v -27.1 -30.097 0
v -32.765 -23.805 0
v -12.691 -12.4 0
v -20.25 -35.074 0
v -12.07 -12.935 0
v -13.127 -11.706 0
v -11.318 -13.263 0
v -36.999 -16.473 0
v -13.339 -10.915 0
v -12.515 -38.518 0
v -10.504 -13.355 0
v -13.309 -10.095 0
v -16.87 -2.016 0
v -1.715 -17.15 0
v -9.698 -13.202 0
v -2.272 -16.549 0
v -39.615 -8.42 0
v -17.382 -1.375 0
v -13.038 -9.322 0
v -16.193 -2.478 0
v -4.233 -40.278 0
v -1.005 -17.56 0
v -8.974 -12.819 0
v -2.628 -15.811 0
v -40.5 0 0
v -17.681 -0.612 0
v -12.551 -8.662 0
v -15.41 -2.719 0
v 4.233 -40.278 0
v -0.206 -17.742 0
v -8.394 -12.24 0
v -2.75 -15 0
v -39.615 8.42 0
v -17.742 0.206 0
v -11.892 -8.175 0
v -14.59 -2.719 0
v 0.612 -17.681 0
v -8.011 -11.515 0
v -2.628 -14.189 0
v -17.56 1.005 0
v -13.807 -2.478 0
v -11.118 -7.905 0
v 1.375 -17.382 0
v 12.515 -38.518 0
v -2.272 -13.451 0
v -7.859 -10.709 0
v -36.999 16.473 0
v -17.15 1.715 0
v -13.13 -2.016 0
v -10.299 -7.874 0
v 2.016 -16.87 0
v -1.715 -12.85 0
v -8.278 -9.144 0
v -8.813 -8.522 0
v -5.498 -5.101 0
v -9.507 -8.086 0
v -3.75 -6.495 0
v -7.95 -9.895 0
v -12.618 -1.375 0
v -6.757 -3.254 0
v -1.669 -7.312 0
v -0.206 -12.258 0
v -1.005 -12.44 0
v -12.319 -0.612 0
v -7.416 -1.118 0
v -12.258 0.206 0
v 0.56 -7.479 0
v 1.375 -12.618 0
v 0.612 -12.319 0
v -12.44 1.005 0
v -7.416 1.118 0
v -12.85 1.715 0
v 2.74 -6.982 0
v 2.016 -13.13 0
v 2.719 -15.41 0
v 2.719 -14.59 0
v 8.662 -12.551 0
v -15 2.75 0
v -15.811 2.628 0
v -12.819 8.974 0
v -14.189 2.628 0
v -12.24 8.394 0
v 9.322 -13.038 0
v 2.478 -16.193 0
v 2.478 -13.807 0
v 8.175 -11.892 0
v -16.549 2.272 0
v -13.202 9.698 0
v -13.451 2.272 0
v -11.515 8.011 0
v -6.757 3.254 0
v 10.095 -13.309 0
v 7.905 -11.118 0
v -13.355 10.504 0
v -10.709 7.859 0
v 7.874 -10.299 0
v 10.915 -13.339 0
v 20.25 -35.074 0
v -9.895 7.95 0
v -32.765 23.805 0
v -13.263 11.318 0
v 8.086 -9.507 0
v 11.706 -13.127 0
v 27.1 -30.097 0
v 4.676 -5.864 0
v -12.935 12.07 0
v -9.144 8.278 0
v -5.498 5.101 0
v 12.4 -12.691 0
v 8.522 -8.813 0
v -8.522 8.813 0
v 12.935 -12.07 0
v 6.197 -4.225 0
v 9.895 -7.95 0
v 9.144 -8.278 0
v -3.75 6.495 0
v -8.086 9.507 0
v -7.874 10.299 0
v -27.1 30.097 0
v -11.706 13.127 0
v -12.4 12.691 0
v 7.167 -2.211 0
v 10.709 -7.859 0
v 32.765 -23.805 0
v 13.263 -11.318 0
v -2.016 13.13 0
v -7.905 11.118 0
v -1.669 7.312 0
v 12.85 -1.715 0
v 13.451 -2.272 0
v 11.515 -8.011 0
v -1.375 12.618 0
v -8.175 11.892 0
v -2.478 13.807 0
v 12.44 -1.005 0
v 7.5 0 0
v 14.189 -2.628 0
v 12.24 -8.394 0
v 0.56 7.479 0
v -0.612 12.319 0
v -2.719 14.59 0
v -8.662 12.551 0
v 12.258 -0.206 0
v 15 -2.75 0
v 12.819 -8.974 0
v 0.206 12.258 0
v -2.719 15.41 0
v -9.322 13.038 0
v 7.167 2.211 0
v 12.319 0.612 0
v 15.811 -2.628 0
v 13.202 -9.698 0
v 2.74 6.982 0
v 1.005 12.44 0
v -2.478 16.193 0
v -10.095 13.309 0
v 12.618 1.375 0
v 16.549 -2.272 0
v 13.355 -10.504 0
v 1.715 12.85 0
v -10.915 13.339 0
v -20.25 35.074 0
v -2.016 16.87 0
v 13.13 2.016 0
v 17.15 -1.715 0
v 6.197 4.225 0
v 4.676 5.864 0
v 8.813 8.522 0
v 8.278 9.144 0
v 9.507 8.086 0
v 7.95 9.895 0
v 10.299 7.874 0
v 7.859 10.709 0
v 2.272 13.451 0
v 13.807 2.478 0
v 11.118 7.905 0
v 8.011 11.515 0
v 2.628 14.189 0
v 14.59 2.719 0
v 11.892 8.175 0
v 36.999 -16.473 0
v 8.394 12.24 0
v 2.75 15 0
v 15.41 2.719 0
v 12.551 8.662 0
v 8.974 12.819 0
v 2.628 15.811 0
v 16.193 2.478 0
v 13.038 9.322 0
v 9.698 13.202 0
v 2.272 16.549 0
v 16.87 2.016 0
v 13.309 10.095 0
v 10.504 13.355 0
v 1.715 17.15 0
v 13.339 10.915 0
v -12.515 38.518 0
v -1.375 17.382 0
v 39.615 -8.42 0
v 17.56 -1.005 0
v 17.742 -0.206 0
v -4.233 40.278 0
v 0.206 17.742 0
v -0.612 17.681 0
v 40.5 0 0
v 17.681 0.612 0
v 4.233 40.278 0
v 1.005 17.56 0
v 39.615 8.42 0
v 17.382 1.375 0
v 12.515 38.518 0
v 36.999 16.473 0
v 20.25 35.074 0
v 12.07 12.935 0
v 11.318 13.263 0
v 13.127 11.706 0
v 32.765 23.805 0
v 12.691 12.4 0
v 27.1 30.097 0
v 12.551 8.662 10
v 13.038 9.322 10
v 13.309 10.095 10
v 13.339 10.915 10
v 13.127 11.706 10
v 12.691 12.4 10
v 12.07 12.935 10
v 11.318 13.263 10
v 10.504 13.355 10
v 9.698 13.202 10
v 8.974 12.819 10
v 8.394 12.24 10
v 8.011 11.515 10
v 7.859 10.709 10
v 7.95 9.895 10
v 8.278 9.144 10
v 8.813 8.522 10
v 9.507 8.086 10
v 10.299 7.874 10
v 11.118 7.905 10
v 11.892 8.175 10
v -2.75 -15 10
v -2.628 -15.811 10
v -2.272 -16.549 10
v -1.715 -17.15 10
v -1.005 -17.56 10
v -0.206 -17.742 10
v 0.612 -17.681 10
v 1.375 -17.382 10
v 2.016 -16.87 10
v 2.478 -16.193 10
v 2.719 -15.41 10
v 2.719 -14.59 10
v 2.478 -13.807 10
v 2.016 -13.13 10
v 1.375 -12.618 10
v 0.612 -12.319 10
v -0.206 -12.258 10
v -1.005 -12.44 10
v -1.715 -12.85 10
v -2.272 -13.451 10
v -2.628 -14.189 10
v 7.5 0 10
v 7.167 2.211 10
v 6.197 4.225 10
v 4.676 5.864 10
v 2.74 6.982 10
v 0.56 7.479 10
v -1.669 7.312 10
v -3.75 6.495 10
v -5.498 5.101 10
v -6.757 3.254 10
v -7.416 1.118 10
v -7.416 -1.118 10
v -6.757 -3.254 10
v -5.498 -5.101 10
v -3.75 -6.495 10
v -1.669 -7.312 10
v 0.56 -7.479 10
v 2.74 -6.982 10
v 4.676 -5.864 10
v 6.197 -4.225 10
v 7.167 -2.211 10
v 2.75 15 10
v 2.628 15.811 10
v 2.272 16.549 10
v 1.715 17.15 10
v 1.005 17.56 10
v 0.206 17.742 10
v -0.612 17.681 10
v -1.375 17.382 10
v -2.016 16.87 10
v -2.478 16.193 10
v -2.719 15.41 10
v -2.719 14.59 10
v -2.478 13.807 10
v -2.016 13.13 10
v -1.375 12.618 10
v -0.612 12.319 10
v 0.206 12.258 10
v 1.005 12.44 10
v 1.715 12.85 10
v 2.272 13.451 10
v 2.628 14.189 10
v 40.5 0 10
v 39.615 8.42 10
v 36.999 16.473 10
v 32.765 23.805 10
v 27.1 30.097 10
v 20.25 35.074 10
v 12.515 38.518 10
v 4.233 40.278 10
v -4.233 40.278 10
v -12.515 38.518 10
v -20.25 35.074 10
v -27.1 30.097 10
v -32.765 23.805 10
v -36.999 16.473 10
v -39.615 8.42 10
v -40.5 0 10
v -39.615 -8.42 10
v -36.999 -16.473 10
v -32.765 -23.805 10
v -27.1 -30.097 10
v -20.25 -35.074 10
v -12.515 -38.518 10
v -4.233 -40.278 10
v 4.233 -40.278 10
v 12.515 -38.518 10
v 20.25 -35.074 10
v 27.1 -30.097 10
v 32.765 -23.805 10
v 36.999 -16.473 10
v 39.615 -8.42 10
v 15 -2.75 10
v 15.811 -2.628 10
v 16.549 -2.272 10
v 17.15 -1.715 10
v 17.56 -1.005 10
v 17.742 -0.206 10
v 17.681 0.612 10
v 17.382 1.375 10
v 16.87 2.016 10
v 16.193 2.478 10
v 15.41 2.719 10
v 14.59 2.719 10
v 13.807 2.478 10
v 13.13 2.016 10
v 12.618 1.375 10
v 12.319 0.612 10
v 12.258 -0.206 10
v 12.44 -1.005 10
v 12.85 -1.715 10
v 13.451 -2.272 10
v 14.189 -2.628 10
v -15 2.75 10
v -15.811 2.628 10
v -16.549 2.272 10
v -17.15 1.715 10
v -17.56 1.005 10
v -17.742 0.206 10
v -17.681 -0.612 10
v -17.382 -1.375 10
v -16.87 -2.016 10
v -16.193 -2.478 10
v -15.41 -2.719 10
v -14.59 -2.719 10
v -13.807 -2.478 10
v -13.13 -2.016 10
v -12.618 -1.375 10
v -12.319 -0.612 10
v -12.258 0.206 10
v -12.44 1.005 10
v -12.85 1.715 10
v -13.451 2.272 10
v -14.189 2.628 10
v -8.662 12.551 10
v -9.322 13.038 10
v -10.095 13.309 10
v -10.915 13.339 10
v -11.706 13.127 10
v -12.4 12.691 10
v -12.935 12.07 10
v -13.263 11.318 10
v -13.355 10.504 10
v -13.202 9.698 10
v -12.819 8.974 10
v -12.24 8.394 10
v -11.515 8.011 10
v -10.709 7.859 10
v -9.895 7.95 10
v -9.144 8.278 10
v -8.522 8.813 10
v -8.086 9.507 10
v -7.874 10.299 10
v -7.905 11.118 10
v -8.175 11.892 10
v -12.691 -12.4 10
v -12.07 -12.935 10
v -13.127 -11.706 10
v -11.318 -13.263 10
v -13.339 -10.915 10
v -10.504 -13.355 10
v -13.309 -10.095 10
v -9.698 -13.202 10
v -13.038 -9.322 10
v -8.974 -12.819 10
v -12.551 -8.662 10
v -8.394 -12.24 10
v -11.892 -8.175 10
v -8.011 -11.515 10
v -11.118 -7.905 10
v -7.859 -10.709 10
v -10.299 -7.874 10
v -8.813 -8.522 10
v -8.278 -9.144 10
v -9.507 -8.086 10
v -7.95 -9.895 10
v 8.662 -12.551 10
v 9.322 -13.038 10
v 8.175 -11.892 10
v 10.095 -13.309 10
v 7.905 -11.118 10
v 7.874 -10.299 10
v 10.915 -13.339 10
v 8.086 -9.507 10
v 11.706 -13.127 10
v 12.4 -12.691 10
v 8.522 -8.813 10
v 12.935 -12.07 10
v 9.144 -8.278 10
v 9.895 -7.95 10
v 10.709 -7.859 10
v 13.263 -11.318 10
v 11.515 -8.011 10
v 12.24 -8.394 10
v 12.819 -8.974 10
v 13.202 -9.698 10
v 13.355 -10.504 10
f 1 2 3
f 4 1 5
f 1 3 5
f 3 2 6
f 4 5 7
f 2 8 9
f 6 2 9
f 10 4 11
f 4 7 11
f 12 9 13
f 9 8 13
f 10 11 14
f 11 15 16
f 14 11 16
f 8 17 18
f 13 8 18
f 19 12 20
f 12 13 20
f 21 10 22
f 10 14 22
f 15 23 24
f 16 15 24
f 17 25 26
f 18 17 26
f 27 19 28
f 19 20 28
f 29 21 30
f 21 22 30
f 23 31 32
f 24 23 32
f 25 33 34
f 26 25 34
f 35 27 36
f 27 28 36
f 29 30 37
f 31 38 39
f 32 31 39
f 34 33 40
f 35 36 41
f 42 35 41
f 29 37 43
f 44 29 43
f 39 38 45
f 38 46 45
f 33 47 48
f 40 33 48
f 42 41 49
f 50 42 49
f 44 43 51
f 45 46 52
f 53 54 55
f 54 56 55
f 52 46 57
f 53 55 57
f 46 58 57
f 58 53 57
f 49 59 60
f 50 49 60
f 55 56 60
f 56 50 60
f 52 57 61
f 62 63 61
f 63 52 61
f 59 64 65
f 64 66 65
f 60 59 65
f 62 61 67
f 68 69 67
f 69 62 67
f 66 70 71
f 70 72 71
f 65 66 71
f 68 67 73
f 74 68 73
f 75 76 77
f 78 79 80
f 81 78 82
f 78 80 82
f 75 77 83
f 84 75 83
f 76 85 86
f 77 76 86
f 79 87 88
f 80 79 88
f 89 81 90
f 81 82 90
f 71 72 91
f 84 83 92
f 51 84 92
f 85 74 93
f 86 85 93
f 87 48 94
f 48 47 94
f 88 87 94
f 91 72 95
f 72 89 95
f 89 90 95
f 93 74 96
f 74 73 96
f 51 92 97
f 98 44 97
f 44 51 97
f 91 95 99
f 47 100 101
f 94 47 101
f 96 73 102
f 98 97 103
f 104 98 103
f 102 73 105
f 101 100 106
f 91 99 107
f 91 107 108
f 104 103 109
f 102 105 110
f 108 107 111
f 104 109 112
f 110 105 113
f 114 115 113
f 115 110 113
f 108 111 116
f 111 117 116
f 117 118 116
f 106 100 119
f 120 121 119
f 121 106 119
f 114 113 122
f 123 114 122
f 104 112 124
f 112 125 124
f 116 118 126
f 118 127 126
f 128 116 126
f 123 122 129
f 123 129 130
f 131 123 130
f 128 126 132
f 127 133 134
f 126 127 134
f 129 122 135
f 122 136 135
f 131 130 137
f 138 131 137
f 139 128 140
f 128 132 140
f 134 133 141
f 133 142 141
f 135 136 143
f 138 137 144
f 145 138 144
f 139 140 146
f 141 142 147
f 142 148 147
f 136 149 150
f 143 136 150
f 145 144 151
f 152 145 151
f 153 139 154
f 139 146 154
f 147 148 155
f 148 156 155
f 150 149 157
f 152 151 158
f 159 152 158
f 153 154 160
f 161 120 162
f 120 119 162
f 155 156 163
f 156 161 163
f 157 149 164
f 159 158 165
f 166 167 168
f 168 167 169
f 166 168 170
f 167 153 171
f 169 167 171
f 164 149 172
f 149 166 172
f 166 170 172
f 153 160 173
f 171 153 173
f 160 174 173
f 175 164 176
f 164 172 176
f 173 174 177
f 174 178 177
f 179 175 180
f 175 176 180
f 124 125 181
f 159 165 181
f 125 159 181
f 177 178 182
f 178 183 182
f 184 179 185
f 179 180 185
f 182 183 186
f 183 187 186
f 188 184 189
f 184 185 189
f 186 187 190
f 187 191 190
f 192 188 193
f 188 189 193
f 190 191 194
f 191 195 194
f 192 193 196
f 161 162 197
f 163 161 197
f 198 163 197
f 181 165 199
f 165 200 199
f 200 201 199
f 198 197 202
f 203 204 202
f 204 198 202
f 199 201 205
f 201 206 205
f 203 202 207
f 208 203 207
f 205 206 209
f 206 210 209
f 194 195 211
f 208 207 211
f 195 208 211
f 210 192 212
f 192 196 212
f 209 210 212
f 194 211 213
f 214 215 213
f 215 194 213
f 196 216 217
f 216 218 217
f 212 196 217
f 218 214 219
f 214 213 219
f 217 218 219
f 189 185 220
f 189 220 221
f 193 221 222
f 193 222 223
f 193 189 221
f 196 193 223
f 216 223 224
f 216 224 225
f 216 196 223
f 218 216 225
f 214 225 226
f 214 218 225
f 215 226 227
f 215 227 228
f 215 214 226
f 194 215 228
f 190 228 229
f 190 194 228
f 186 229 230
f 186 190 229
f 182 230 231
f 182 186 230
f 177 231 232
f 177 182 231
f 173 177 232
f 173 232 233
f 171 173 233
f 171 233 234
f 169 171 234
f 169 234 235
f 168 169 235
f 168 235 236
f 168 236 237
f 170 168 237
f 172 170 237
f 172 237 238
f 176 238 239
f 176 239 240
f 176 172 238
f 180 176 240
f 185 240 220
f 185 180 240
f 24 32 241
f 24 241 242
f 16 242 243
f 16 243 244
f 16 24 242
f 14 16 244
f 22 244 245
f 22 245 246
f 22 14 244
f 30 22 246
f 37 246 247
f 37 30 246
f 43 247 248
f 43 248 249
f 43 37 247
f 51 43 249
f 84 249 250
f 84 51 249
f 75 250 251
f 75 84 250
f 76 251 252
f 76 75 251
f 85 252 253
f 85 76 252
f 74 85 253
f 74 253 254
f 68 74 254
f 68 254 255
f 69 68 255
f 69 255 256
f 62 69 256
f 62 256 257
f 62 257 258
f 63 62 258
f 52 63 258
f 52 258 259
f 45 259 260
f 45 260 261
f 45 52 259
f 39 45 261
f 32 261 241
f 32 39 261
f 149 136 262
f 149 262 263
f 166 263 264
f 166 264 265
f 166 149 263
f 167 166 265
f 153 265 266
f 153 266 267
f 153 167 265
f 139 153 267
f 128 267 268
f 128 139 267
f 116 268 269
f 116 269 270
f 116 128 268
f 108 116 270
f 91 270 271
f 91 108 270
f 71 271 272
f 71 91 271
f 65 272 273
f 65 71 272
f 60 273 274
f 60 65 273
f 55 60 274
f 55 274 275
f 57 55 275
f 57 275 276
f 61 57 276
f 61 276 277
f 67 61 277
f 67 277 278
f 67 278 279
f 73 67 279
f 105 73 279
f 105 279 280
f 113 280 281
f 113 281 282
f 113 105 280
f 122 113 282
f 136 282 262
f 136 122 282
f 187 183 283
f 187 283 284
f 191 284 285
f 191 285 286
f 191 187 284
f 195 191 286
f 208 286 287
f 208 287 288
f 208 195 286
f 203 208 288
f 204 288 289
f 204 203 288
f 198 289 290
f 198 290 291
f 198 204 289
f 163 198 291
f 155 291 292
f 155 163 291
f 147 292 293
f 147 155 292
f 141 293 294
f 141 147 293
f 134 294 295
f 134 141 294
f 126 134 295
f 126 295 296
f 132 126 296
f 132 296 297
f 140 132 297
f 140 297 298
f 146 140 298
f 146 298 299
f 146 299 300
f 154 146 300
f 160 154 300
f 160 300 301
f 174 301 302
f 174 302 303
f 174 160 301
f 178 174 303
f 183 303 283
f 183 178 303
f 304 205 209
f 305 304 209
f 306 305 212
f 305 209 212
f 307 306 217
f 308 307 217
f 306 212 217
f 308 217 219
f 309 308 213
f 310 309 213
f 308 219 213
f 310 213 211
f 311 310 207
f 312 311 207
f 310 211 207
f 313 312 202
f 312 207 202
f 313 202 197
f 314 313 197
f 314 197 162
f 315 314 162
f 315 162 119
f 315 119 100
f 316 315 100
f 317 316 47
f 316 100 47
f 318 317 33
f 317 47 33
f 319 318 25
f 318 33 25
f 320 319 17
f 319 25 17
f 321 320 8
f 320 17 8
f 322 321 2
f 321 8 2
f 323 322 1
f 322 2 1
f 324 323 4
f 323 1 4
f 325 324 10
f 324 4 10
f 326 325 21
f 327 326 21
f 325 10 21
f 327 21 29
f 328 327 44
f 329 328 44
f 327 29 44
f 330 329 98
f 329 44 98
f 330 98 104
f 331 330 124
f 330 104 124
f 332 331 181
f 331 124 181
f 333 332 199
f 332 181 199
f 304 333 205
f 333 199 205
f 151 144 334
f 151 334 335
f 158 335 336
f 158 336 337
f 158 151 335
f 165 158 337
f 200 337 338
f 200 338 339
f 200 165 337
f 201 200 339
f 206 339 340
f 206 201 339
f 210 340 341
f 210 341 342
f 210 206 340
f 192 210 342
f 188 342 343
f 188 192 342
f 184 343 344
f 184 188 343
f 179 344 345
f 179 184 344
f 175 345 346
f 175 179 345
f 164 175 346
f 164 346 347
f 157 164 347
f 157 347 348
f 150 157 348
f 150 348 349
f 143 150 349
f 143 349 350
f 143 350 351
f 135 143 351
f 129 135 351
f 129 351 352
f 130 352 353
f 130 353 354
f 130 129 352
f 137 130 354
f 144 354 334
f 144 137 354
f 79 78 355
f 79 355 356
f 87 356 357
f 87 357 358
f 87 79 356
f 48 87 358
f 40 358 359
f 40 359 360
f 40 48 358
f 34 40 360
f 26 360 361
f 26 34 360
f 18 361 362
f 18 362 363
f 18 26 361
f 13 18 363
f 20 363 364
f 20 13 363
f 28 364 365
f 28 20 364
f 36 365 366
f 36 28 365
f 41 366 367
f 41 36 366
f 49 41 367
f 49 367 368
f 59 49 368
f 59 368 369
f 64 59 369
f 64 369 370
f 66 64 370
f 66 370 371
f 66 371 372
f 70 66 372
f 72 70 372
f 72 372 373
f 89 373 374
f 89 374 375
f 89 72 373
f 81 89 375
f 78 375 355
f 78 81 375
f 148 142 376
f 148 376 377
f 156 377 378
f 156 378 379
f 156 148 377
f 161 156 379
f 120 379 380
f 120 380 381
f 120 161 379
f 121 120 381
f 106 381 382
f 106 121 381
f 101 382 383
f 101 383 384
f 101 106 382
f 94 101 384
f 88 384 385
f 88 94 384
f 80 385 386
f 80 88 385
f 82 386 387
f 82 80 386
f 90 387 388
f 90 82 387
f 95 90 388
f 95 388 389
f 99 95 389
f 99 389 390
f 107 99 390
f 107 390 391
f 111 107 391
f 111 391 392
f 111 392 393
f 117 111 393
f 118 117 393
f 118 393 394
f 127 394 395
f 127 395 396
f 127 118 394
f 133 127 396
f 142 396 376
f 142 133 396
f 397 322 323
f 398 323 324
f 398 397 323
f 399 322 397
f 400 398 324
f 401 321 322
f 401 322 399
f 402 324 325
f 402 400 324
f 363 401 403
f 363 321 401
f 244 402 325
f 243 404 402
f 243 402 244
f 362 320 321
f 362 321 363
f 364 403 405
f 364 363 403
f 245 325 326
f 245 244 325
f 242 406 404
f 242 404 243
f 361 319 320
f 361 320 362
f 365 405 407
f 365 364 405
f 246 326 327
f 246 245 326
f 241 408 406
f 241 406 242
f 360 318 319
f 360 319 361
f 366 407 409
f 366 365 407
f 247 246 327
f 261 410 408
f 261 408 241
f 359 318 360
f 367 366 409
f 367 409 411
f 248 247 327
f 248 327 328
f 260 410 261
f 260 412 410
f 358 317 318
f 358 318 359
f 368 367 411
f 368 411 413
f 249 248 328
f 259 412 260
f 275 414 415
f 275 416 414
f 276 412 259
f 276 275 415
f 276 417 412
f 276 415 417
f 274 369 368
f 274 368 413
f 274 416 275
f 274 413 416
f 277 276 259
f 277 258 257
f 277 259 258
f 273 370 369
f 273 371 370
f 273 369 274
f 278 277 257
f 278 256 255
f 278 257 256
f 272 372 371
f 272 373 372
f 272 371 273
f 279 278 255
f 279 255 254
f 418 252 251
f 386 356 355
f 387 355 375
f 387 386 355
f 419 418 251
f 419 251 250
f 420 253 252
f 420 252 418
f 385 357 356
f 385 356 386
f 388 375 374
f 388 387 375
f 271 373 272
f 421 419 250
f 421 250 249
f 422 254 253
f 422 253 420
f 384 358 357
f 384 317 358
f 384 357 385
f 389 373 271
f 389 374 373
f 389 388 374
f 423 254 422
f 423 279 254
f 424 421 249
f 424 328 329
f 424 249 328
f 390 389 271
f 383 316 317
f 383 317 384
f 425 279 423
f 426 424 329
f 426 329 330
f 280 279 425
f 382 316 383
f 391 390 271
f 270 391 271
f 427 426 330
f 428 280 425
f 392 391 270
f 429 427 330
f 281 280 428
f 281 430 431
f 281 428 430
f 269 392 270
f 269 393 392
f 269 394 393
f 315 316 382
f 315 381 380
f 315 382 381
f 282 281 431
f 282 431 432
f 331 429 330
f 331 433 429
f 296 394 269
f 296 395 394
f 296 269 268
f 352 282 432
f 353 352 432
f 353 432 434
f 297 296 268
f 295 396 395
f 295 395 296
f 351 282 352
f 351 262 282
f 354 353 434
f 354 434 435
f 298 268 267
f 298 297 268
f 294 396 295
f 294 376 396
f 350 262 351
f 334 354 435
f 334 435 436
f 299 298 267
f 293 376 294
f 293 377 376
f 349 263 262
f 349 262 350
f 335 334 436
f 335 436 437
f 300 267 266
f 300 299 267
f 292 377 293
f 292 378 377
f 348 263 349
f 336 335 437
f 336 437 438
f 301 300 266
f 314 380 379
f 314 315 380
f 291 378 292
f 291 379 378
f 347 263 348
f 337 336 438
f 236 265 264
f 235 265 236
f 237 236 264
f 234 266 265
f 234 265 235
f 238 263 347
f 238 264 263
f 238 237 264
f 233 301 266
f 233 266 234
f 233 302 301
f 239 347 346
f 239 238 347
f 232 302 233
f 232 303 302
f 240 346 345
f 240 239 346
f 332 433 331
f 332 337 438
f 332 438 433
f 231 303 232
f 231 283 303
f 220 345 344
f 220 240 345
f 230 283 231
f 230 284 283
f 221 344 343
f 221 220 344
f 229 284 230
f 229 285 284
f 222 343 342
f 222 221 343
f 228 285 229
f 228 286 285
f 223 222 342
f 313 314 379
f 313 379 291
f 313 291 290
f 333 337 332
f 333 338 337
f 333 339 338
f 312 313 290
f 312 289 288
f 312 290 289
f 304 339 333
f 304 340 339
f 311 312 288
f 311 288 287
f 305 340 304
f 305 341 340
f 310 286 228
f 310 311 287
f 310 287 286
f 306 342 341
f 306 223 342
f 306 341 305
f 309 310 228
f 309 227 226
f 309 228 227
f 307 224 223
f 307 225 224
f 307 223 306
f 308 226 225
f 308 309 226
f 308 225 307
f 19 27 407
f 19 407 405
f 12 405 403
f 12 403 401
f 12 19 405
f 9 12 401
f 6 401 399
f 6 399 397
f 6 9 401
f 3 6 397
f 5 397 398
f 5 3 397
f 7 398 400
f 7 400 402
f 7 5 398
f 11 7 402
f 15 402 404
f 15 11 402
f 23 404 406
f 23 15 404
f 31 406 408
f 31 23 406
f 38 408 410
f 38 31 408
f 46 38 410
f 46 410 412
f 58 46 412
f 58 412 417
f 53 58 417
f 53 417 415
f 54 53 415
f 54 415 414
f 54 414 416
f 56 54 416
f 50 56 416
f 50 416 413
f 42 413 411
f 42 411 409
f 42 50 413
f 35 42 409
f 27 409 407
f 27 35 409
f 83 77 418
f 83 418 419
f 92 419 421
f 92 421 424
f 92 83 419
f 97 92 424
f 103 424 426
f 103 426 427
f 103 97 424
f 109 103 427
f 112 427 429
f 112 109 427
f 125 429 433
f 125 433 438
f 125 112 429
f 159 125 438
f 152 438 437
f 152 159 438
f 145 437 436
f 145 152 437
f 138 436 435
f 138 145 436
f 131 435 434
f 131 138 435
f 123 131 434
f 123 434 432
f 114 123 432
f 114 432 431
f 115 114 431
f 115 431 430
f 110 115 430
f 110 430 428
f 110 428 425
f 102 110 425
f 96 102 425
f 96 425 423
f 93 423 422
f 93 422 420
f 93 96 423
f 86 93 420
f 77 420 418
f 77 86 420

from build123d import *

# Parameters (mm, degrees)
SKETCH1_R         = 40.5
SKETCH1_R_2       = 7.5
EXTRUDE_1_4_DEPTH = 10
SKETCH2_R         = 2.75
M5_THROUGH_DEPTH  = 10
CIRPATTERN5_COUNT = 8


with BuildPart() as part:
    # Sketch1 → 1/4 (new body)
    with BuildSketch(Plane.XY):
        Circle(SKETCH1_R)
        Circle(SKETCH1_R_2, mode=Mode.SUBTRACT)
    extrude(amount=EXTRUDE_1_4_DEPTH)

    # Sketch2 → M5_through (cut)
    with BuildSketch(Plane.XY):
        with Locations((0, 15)):
            Circle(SKETCH2_R)
    m5_through = extrude(amount=M5_THROUGH_DEPTH, mode=Mode.SUBTRACT)

    # CirPattern5: M5_through ×8 about axis
    cirpattern5_axis = Axis((0, 0, 0), (0, 0, 1))
    for i in range(1, CIRPATTERN5_COUNT):
        add(m5_through.rotate(cirpattern5_axis, i * 360 / CIRPATTERN5_COUNT), mode=Mode.SUBTRACT)


solid = part.part
